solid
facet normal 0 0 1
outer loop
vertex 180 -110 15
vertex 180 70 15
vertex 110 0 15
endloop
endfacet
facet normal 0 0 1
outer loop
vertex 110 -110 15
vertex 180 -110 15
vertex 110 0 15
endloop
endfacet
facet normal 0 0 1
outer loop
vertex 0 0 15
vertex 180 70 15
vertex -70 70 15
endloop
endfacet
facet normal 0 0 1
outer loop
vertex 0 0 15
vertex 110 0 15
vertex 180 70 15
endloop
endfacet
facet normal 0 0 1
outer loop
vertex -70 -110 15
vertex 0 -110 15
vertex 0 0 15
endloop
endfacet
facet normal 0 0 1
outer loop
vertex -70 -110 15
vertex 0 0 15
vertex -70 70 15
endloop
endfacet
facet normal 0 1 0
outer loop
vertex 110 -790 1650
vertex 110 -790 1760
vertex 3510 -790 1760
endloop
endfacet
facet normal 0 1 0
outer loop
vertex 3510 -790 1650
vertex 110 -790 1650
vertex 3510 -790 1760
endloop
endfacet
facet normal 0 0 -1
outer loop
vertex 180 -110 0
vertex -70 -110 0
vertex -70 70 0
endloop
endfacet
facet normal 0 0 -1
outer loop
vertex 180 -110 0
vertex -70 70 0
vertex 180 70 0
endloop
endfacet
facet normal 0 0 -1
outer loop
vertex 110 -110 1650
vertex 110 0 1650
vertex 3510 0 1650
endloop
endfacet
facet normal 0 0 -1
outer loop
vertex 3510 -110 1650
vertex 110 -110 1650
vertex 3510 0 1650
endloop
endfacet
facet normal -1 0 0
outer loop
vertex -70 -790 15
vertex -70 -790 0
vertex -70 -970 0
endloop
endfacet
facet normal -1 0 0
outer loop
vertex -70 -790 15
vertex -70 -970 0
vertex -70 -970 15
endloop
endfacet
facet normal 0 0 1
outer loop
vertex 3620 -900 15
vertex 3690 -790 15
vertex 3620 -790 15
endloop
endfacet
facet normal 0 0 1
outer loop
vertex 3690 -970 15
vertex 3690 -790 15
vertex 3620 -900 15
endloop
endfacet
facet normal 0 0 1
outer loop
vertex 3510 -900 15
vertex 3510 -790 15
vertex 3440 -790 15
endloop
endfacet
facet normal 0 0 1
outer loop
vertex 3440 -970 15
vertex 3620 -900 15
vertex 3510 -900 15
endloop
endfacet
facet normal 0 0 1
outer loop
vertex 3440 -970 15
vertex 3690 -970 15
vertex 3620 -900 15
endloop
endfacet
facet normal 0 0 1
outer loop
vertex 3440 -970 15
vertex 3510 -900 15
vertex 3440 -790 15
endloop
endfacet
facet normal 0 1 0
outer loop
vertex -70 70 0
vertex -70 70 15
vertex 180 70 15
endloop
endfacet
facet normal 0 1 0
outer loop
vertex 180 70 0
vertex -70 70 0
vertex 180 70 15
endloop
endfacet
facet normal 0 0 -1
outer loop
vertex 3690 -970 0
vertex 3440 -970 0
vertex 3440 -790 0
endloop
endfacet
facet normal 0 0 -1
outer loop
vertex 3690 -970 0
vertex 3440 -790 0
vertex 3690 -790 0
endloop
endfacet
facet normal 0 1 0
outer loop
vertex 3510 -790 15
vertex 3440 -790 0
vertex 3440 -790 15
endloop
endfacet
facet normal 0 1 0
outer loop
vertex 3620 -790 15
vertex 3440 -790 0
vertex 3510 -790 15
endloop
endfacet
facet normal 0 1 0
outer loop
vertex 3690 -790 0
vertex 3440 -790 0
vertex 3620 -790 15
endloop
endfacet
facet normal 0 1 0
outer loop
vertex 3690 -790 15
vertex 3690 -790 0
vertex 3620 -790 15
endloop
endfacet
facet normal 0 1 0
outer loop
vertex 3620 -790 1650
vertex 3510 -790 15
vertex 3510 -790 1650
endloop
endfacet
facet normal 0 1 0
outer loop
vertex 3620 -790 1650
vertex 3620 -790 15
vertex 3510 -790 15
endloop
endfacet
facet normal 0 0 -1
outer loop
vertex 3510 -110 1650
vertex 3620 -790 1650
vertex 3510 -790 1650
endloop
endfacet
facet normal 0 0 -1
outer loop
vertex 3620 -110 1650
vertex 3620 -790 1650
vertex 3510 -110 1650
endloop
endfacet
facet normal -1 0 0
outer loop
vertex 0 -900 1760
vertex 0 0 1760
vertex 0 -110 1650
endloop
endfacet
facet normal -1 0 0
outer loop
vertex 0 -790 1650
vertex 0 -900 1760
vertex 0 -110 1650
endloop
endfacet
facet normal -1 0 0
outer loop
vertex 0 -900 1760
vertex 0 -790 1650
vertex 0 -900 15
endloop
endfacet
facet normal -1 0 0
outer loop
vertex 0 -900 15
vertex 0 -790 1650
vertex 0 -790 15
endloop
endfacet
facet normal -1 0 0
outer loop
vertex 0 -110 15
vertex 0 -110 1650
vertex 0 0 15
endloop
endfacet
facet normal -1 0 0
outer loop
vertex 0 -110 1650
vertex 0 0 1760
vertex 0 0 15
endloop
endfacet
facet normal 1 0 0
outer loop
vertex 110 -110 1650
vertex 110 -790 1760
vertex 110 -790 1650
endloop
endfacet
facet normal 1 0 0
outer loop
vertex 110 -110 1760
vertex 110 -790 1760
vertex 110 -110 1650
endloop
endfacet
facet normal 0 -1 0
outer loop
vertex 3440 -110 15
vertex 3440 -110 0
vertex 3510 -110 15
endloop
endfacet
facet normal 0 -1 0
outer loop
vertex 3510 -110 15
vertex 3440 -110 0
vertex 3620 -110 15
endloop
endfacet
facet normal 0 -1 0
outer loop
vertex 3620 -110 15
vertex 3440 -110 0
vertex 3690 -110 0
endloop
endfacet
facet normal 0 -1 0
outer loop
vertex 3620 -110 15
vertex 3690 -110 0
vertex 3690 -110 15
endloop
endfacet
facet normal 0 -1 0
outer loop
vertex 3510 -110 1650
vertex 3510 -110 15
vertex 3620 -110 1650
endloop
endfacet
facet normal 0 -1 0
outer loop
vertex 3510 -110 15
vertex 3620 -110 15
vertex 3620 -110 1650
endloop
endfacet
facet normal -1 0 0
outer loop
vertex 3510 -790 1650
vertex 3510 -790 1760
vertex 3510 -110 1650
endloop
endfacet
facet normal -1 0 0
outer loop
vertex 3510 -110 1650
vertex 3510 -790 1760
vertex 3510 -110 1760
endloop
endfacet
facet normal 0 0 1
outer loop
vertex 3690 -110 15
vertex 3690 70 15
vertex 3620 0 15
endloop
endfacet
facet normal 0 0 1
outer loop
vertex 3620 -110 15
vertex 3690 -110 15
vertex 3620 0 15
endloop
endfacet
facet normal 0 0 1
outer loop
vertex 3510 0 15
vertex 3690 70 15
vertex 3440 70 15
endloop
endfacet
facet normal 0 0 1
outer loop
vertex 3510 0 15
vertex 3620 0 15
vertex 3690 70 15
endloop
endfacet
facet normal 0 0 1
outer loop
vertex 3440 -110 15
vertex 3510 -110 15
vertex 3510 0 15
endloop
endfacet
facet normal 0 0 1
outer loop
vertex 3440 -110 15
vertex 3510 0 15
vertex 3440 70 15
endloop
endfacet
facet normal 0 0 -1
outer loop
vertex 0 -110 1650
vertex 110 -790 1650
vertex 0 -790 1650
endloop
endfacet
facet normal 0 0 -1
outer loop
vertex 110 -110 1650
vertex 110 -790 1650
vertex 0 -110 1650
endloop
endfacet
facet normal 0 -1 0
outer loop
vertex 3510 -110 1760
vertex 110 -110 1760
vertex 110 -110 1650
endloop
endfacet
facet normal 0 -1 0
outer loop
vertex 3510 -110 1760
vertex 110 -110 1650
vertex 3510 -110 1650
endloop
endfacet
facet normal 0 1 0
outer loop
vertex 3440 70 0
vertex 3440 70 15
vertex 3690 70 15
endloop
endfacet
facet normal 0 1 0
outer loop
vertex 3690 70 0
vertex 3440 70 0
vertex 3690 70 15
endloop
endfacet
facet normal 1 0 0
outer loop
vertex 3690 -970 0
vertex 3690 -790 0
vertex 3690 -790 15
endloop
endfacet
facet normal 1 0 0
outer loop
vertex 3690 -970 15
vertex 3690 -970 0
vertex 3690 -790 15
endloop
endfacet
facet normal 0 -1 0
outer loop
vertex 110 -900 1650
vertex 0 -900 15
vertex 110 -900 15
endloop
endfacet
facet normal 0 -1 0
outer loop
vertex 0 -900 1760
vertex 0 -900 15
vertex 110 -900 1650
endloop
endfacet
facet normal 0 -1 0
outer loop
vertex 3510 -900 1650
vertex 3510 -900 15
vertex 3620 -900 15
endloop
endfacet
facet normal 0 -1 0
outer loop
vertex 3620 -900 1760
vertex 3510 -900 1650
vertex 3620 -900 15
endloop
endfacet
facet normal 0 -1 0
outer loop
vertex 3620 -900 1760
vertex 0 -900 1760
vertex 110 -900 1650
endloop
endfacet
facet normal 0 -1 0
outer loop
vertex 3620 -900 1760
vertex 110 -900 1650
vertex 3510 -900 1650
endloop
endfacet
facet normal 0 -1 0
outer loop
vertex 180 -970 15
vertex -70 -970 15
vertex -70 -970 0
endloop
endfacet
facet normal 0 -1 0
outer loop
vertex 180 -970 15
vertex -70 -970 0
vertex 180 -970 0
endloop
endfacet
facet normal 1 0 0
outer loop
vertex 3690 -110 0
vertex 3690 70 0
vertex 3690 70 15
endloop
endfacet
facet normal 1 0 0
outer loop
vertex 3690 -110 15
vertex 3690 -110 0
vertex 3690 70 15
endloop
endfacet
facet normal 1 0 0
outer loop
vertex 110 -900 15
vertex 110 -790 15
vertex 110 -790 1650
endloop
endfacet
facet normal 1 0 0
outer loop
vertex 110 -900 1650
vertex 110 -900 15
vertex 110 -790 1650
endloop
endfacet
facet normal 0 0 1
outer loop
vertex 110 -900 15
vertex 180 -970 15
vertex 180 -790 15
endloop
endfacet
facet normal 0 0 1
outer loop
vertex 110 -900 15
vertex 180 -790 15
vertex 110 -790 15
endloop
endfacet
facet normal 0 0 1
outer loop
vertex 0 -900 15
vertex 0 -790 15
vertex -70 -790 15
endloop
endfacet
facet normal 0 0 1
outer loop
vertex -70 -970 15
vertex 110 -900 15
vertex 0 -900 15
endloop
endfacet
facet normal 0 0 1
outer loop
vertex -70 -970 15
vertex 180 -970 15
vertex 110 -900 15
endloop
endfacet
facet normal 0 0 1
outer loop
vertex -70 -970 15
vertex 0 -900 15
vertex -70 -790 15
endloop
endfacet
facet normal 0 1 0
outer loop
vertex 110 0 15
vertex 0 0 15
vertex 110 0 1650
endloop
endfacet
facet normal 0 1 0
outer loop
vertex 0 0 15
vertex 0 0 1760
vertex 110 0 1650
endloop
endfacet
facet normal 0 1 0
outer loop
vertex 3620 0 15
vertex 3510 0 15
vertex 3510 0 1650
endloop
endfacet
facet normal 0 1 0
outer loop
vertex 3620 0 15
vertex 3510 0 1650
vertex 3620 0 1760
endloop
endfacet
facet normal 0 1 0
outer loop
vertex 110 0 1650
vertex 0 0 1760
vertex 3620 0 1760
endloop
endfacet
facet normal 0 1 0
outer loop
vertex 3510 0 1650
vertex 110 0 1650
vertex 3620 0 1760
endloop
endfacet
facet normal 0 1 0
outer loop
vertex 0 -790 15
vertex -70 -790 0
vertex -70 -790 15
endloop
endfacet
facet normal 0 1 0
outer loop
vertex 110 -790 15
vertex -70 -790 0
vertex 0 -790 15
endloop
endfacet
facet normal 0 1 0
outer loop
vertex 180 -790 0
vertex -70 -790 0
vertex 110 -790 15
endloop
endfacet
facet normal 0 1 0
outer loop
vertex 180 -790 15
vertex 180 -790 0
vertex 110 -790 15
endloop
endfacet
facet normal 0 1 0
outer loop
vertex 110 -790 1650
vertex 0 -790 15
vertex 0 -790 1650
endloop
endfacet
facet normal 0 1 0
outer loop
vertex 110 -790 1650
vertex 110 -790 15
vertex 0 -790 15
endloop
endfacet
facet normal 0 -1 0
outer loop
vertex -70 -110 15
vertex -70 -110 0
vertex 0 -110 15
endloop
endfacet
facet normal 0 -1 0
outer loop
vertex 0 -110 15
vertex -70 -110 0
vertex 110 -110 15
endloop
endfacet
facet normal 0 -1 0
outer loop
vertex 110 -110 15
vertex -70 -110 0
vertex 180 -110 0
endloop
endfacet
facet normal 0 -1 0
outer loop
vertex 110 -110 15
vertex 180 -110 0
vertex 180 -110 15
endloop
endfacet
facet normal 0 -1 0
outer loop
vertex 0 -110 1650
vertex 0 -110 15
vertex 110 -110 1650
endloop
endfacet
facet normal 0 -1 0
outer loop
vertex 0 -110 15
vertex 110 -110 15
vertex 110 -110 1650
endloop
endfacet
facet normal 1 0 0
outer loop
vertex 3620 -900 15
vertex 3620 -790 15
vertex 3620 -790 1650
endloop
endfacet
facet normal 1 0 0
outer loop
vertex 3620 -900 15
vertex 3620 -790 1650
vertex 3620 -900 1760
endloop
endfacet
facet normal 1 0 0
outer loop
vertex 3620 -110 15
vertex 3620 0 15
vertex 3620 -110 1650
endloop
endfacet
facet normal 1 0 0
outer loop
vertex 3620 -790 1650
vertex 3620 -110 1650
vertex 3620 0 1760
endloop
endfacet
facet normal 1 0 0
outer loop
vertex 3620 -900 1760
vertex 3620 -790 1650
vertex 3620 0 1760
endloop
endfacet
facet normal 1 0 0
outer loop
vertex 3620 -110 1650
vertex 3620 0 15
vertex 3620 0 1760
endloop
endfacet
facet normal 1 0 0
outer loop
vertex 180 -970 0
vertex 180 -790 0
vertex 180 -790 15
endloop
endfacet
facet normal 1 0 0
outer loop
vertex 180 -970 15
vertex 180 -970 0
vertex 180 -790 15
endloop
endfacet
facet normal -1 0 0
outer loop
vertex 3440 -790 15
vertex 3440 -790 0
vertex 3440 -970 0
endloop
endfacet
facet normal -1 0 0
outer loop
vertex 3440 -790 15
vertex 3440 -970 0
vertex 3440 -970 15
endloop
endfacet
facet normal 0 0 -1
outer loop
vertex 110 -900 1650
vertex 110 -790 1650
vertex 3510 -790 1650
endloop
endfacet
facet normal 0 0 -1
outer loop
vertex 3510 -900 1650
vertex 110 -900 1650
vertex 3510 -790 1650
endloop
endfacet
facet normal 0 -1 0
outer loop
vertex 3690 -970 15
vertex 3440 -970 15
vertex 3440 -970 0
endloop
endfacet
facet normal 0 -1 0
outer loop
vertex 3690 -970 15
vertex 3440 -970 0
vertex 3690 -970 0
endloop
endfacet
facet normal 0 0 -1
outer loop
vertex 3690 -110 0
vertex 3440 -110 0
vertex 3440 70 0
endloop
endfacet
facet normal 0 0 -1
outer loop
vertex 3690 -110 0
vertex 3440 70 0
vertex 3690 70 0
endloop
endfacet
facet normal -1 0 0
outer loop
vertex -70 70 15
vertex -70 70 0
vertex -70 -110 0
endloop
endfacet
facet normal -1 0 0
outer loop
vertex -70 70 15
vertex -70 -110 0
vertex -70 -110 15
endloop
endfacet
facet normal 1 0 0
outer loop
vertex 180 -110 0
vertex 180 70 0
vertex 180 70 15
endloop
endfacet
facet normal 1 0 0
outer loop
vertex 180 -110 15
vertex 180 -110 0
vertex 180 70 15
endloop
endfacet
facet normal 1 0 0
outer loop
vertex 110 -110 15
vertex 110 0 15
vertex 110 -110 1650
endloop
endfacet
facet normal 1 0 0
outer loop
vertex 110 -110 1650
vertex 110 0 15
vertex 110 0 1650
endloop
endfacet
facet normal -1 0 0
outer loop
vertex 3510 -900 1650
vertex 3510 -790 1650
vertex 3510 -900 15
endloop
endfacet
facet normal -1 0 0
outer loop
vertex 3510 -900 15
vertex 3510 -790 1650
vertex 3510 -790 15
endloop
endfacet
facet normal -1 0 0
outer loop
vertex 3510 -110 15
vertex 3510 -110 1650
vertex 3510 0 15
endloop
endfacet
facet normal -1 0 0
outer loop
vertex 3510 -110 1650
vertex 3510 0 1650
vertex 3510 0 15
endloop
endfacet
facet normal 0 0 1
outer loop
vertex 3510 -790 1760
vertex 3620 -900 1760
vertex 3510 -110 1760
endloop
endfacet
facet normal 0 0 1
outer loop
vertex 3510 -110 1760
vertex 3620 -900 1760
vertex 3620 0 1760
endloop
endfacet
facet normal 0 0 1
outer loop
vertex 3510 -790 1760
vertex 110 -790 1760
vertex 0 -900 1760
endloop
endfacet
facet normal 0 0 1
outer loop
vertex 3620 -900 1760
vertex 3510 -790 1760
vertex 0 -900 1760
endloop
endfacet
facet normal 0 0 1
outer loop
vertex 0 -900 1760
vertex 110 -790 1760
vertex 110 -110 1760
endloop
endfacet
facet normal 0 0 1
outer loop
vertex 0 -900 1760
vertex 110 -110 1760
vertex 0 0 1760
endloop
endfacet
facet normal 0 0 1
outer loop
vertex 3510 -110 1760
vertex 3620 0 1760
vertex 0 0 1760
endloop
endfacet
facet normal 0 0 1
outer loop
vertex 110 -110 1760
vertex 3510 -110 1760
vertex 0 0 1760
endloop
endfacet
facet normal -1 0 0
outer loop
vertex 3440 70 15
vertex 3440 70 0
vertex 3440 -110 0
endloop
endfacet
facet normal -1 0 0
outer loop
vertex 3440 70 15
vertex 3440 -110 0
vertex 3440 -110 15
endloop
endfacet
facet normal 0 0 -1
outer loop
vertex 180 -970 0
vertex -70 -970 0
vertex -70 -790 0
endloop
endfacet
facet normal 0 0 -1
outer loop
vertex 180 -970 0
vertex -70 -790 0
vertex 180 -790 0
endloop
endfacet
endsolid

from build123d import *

# Parameters (mm, degrees)
F1_DEPTH      = 900
F0_W          = 70
F0_H          = 15
F0_W_2        = 110
F2_DEPTH      = 970
F2_DEPTH_BACK = 70
F3_W          = 680
F3_H          = 1901.932733
F4_DEPTH      = 4500
F5_W          = 3400
F5_H          = 680
F6_DEPTH      = 120


with BuildPart() as f1:
    # F0 (on Front) → F1 (new body)
    with BuildSketch(Plane.XZ):
        Polygon((0, 1760), (0, 15), (110, 15), (110, 1650), (3510, 1650), (3510, 15), (3620, 15), (3620, 1760), align=None)
    extrude(amount=F1_DEPTH)

    # F0 (on Front) → F2 (join, two sides)
    with BuildSketch(Plane.XZ) as f2_sk:
        with Locations((145, 7.5)):
            Rectangle(F0_W, F0_H)
        with Locations((-35, 7.5)):
            Rectangle(F0_W, F0_H)
        with Locations((55, 7.5)):
            Rectangle(F0_W_2, F0_H)
        with Locations((3475, 7.5)):
            Rectangle(F0_W, F0_H)
        with Locations((3565, 7.5)):
            Rectangle(F0_W_2, F0_H)
        with Locations((3655, 7.5)):
            Rectangle(F0_W, F0_H)
    extrude(amount=F2_DEPTH)
    extrude(f2_sk.sketch, amount=-F2_DEPTH_BACK)

    # F3 (on face) → F4 (cut, symmetric)
    with BuildSketch(Plane.YZ.offset(3620)):
        with Locations((-450, 699.033633)):
            Rectangle(F3_W, F3_H)
    extrude(amount=F4_DEPTH, both=True, mode=Mode.SUBTRACT)

    # F5 (on face) → F6 (cut)
    with BuildSketch(Plane.XY.offset(1760)):
        with Locations((1810, -450)):
            Rectangle(F5_W, F5_H)
    extrude(amount=-F6_DEPTH, mode=Mode.SUBTRACT)


solid = f1.part
